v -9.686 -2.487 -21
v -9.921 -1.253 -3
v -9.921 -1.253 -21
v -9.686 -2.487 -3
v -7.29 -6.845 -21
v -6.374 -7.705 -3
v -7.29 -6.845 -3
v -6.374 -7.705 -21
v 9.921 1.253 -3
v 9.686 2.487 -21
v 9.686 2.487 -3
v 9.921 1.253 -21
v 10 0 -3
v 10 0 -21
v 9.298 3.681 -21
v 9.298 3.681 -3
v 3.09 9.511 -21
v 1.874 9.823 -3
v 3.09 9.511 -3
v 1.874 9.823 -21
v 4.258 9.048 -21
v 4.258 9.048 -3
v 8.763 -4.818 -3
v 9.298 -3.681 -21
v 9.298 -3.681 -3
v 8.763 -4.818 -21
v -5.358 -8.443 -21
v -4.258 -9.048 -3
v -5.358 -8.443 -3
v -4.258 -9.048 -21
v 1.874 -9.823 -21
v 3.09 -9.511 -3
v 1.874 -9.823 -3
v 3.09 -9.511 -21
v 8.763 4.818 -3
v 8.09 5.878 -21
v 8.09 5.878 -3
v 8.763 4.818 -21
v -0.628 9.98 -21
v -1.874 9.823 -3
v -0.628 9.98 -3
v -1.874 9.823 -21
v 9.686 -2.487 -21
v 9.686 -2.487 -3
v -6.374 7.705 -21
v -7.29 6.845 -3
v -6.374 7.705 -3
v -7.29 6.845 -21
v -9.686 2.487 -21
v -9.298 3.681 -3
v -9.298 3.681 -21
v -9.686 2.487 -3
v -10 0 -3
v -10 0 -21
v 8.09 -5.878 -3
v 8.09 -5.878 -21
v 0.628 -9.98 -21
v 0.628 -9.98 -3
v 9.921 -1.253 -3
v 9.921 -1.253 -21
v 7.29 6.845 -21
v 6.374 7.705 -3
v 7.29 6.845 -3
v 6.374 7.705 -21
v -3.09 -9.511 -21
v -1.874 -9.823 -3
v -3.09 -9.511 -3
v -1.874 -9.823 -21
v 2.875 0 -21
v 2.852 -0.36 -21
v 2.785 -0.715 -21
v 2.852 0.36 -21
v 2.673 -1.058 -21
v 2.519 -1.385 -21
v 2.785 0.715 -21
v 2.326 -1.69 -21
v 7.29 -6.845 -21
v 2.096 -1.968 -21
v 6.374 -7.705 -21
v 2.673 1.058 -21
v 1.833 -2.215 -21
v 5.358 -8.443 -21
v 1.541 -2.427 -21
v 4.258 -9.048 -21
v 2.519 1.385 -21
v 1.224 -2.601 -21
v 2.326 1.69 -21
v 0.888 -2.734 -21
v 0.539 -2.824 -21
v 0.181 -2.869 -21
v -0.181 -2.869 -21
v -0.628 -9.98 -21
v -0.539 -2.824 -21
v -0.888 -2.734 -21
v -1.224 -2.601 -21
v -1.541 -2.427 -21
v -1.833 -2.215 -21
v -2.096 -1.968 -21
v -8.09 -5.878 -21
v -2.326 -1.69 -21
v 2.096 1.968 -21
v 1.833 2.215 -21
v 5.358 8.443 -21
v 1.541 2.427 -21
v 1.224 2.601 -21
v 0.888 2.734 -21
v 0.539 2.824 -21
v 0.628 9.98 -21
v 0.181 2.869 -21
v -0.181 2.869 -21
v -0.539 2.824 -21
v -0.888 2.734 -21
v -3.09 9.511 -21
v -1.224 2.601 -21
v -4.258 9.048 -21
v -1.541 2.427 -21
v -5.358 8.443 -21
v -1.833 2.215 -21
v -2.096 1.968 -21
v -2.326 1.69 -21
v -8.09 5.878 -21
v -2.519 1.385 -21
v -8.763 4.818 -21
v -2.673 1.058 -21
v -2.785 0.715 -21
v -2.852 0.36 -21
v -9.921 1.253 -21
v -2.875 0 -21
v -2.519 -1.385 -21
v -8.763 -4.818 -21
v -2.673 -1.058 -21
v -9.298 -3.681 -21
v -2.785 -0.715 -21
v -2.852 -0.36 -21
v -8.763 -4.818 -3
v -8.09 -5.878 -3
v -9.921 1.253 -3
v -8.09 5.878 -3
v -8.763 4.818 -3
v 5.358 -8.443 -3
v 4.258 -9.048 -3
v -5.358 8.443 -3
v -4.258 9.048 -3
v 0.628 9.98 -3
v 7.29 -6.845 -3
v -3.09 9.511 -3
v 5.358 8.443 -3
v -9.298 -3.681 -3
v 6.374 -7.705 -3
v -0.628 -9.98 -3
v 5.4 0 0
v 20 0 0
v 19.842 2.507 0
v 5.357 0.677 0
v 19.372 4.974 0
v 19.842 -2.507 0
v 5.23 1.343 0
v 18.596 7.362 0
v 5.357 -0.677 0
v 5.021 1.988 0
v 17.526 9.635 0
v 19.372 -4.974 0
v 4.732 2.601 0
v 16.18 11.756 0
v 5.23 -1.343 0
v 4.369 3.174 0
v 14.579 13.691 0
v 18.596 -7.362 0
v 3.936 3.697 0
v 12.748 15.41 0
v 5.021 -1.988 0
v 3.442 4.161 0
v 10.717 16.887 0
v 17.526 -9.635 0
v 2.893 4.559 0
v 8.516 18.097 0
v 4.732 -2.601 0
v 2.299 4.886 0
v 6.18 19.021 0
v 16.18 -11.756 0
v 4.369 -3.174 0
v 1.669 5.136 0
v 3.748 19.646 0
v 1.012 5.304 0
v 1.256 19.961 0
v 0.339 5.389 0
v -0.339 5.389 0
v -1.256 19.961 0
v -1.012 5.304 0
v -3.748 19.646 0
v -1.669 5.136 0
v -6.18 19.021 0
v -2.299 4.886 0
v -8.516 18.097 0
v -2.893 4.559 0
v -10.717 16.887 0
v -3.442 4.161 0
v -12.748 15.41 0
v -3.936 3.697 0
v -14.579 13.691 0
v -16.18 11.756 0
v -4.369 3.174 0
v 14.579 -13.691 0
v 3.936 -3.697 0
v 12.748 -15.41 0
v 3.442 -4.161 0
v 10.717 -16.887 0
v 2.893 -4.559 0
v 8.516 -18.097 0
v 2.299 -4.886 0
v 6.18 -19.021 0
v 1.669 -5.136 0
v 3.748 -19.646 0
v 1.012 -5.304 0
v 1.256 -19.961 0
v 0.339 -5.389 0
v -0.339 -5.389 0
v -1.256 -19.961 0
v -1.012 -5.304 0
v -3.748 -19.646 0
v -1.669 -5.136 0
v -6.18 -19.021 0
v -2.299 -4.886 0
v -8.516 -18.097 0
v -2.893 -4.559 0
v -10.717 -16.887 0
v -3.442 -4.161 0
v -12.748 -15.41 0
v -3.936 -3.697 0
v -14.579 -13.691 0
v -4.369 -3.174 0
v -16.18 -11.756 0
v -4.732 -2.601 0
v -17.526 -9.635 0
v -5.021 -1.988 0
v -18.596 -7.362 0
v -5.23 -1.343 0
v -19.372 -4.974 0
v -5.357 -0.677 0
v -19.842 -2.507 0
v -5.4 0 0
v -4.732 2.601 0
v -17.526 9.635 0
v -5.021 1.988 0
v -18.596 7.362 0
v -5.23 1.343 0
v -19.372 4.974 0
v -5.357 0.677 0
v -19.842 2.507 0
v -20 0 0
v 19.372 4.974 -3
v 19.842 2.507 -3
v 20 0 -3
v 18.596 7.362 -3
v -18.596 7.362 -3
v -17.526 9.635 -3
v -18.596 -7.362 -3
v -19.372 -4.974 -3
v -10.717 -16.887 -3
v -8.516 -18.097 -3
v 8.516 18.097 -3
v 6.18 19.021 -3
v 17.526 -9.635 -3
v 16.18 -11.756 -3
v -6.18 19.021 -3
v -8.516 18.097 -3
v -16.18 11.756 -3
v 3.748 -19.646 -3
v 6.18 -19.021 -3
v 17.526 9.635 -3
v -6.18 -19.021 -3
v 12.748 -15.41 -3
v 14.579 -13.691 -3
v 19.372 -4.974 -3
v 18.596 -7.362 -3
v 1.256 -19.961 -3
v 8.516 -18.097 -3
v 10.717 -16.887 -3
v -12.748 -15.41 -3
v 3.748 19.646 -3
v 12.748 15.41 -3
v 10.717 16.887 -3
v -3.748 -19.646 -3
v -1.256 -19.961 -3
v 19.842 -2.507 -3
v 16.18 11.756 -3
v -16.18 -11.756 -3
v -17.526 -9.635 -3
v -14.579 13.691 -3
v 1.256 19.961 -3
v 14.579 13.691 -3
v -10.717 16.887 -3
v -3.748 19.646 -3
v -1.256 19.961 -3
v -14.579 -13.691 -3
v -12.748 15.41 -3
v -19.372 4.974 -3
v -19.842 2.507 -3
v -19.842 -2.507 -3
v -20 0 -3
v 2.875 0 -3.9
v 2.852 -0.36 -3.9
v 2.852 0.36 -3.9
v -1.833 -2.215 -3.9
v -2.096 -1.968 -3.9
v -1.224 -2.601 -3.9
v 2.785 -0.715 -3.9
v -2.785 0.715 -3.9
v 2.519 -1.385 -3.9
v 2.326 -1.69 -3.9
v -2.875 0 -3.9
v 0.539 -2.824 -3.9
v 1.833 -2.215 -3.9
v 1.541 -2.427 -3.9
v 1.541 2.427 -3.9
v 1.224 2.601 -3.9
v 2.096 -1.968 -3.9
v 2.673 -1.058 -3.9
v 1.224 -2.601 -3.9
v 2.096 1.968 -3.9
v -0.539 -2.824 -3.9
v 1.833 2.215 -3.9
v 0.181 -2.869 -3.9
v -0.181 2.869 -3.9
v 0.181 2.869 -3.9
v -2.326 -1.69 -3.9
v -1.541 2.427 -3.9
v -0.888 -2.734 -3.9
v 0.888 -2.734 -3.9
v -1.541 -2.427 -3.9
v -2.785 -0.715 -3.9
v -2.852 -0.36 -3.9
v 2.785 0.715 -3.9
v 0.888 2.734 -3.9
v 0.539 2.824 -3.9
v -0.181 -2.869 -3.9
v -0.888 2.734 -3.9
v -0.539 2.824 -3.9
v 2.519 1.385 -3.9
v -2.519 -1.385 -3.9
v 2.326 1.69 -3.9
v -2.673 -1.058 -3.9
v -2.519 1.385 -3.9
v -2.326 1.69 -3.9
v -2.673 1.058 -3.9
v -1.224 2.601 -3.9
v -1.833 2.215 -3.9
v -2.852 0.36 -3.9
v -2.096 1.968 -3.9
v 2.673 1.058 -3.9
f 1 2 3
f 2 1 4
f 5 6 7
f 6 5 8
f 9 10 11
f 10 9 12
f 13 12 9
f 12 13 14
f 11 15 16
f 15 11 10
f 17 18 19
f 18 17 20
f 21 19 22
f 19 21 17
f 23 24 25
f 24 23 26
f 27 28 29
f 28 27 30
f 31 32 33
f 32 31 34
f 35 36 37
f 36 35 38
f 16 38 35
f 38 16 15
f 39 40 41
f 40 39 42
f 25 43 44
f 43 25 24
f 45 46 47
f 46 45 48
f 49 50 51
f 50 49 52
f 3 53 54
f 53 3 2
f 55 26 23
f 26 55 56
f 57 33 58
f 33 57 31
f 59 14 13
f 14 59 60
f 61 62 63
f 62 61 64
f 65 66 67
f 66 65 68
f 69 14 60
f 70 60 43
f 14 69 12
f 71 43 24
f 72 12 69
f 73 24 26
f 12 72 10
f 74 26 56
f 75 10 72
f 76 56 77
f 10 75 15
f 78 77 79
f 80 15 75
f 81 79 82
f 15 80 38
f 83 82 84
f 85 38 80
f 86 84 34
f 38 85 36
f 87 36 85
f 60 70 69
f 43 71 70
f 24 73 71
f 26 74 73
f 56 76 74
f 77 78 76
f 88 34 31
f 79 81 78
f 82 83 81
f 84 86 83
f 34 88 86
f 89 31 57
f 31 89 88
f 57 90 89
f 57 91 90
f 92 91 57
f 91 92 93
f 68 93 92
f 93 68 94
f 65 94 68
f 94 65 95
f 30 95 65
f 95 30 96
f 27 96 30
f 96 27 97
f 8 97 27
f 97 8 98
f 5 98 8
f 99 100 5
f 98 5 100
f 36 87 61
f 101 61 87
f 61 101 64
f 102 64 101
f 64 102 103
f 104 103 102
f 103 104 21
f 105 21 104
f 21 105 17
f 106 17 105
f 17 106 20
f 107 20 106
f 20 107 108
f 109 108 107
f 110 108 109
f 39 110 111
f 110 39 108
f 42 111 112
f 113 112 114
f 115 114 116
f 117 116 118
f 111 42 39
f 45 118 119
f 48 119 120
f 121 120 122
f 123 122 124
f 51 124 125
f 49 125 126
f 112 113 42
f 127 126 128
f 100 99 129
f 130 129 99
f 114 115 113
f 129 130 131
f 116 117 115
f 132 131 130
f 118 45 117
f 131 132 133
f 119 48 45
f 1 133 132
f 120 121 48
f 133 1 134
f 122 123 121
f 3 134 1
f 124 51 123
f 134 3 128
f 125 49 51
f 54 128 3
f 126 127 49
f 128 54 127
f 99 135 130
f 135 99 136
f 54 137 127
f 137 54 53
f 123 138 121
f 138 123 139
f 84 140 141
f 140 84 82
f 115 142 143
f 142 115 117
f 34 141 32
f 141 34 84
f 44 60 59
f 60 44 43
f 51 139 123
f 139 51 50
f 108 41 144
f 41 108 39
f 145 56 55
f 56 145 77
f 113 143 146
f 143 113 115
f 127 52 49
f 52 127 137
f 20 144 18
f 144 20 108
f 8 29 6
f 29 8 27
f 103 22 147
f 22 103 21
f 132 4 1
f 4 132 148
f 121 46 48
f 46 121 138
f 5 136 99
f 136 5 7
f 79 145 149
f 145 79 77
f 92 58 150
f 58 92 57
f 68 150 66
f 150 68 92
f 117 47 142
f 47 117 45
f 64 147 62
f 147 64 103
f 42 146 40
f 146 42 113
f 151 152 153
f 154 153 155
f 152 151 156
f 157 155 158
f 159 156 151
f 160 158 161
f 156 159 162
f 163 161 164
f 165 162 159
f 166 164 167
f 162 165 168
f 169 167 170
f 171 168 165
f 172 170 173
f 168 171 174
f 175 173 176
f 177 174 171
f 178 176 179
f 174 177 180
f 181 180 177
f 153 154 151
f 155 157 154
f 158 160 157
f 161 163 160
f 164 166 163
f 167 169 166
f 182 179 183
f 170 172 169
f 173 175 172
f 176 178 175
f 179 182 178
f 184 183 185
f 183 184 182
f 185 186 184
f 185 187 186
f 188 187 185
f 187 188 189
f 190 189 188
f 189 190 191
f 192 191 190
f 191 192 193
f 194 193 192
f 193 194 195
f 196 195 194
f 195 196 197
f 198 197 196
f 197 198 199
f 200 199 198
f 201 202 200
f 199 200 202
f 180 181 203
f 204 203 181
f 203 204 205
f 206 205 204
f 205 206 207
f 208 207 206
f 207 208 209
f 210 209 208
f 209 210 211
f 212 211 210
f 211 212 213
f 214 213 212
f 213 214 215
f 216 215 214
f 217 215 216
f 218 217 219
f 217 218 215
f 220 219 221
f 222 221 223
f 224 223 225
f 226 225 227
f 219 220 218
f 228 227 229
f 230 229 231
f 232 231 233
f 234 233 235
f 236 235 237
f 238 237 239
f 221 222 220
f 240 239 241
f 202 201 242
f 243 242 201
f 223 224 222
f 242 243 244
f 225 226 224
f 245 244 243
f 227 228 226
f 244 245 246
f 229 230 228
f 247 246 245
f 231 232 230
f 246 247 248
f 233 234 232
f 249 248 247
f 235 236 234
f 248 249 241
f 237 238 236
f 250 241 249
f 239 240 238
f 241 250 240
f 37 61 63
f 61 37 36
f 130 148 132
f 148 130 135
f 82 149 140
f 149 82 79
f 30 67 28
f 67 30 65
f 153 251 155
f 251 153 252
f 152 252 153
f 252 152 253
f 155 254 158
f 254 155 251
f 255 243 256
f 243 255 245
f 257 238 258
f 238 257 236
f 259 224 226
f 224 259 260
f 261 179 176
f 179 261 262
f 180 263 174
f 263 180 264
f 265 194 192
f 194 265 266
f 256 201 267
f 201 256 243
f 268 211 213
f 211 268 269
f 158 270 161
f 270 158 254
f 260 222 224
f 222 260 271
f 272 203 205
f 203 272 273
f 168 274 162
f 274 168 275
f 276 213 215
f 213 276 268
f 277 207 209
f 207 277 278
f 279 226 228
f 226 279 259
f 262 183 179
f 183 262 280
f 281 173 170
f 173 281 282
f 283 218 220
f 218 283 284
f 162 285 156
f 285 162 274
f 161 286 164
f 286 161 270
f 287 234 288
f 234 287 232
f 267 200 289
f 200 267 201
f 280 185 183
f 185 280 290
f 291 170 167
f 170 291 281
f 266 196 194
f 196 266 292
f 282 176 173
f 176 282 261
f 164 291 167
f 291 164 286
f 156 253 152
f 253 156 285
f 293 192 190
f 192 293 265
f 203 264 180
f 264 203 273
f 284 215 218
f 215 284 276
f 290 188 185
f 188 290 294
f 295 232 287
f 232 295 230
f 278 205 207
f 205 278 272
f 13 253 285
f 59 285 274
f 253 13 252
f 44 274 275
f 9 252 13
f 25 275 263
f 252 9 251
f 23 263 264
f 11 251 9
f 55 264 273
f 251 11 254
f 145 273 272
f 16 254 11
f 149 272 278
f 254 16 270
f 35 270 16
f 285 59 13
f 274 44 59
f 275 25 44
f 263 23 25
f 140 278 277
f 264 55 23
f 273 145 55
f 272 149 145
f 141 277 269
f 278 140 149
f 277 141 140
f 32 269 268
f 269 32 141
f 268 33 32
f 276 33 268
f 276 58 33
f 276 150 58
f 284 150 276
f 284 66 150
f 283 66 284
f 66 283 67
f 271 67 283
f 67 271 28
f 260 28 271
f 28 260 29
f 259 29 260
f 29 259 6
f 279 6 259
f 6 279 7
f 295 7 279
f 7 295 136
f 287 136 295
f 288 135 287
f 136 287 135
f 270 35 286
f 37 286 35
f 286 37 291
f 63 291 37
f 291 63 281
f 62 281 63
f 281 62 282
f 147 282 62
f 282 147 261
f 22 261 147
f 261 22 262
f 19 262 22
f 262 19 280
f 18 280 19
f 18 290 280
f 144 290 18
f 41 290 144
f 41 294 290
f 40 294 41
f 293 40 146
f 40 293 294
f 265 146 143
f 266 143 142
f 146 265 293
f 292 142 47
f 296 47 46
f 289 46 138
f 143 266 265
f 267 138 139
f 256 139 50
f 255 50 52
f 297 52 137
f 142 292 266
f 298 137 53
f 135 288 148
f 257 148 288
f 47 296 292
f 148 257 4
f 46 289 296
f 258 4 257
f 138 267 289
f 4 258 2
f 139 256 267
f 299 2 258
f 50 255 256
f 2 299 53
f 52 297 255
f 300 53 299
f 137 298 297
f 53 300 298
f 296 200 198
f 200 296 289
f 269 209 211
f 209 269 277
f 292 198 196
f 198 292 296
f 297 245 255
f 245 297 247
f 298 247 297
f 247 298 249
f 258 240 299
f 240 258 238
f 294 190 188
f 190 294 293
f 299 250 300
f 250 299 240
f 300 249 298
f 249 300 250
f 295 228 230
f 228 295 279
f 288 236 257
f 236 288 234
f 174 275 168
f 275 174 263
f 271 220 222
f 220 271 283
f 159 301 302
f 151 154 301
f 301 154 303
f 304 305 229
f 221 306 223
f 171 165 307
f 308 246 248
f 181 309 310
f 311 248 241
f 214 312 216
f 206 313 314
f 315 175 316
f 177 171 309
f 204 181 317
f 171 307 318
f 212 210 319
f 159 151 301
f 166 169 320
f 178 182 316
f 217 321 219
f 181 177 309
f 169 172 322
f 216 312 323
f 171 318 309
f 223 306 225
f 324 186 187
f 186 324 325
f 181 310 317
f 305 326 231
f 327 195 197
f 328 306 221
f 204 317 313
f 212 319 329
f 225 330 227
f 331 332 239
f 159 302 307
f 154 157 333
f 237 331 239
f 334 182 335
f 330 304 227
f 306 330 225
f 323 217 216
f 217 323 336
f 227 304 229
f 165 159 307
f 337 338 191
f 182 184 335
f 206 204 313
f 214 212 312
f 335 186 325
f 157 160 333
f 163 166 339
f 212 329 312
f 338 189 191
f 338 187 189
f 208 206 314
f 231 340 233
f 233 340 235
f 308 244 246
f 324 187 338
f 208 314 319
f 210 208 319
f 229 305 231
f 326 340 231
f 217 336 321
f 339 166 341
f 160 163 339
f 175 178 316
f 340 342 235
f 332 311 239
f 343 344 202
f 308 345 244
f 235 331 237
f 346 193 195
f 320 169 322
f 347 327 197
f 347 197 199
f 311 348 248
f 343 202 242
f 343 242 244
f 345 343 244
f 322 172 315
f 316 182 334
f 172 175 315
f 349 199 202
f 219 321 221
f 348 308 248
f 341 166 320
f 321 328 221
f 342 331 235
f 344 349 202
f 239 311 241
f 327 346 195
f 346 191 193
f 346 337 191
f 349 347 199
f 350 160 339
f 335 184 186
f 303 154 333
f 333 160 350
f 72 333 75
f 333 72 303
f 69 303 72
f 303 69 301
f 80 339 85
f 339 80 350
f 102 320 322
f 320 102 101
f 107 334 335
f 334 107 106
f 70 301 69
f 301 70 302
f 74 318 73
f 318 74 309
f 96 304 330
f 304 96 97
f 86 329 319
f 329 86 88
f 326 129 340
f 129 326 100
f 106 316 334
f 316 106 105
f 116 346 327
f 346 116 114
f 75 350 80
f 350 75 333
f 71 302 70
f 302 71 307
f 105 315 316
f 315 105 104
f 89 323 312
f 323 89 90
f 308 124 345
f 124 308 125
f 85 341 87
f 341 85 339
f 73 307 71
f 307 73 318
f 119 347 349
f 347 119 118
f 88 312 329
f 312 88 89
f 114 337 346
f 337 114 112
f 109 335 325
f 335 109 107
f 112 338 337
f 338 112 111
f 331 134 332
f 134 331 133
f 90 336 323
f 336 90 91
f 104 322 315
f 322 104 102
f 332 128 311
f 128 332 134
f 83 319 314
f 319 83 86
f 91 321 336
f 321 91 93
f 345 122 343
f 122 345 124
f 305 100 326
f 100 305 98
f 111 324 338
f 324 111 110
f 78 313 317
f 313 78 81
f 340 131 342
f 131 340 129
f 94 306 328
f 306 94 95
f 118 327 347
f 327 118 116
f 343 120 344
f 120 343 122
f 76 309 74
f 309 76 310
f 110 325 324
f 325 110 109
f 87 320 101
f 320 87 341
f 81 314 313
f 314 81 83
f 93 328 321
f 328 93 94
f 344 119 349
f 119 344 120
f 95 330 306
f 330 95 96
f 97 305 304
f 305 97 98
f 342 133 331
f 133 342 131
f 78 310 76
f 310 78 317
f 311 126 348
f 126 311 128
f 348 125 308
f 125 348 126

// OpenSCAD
$fn = 50;


difference() {
	union() {
		translate(v = [0, 0, -21.0000000000]) {
			cylinder(h = 21, r = 10.0000000000);
		}
		translate(v = [0, 0, -3.0000000000]) {
			cylinder(h = 3, r = 20.0000000000);
		}
	}
	union() {
		translate(v = [0, 0, 0]) {
			rotate(a = [0, 0, 0]) {
				difference() {
					union() {
						#translate(v = [0, 0, -21.0000000000]) {
							cylinder(h = 21, r = 2.6000000000);
						}
						#translate(v = [0, 0, -3.9000000000]) {
							cylinder(h = 3.9000000000, r1 = 2.8750000000, r2 = 5.4000000000);
						}
						#translate(v = [0, 0, -21.0000000000]) {
							cylinder(h = 21, r = 2.8750000000);
						}
						#translate(v = [0, 0, -21.0000000000]) {
							cylinder(h = 21, r = 2.6000000000);
						}
					}
					union();
				}
			}
		}
	}
}
